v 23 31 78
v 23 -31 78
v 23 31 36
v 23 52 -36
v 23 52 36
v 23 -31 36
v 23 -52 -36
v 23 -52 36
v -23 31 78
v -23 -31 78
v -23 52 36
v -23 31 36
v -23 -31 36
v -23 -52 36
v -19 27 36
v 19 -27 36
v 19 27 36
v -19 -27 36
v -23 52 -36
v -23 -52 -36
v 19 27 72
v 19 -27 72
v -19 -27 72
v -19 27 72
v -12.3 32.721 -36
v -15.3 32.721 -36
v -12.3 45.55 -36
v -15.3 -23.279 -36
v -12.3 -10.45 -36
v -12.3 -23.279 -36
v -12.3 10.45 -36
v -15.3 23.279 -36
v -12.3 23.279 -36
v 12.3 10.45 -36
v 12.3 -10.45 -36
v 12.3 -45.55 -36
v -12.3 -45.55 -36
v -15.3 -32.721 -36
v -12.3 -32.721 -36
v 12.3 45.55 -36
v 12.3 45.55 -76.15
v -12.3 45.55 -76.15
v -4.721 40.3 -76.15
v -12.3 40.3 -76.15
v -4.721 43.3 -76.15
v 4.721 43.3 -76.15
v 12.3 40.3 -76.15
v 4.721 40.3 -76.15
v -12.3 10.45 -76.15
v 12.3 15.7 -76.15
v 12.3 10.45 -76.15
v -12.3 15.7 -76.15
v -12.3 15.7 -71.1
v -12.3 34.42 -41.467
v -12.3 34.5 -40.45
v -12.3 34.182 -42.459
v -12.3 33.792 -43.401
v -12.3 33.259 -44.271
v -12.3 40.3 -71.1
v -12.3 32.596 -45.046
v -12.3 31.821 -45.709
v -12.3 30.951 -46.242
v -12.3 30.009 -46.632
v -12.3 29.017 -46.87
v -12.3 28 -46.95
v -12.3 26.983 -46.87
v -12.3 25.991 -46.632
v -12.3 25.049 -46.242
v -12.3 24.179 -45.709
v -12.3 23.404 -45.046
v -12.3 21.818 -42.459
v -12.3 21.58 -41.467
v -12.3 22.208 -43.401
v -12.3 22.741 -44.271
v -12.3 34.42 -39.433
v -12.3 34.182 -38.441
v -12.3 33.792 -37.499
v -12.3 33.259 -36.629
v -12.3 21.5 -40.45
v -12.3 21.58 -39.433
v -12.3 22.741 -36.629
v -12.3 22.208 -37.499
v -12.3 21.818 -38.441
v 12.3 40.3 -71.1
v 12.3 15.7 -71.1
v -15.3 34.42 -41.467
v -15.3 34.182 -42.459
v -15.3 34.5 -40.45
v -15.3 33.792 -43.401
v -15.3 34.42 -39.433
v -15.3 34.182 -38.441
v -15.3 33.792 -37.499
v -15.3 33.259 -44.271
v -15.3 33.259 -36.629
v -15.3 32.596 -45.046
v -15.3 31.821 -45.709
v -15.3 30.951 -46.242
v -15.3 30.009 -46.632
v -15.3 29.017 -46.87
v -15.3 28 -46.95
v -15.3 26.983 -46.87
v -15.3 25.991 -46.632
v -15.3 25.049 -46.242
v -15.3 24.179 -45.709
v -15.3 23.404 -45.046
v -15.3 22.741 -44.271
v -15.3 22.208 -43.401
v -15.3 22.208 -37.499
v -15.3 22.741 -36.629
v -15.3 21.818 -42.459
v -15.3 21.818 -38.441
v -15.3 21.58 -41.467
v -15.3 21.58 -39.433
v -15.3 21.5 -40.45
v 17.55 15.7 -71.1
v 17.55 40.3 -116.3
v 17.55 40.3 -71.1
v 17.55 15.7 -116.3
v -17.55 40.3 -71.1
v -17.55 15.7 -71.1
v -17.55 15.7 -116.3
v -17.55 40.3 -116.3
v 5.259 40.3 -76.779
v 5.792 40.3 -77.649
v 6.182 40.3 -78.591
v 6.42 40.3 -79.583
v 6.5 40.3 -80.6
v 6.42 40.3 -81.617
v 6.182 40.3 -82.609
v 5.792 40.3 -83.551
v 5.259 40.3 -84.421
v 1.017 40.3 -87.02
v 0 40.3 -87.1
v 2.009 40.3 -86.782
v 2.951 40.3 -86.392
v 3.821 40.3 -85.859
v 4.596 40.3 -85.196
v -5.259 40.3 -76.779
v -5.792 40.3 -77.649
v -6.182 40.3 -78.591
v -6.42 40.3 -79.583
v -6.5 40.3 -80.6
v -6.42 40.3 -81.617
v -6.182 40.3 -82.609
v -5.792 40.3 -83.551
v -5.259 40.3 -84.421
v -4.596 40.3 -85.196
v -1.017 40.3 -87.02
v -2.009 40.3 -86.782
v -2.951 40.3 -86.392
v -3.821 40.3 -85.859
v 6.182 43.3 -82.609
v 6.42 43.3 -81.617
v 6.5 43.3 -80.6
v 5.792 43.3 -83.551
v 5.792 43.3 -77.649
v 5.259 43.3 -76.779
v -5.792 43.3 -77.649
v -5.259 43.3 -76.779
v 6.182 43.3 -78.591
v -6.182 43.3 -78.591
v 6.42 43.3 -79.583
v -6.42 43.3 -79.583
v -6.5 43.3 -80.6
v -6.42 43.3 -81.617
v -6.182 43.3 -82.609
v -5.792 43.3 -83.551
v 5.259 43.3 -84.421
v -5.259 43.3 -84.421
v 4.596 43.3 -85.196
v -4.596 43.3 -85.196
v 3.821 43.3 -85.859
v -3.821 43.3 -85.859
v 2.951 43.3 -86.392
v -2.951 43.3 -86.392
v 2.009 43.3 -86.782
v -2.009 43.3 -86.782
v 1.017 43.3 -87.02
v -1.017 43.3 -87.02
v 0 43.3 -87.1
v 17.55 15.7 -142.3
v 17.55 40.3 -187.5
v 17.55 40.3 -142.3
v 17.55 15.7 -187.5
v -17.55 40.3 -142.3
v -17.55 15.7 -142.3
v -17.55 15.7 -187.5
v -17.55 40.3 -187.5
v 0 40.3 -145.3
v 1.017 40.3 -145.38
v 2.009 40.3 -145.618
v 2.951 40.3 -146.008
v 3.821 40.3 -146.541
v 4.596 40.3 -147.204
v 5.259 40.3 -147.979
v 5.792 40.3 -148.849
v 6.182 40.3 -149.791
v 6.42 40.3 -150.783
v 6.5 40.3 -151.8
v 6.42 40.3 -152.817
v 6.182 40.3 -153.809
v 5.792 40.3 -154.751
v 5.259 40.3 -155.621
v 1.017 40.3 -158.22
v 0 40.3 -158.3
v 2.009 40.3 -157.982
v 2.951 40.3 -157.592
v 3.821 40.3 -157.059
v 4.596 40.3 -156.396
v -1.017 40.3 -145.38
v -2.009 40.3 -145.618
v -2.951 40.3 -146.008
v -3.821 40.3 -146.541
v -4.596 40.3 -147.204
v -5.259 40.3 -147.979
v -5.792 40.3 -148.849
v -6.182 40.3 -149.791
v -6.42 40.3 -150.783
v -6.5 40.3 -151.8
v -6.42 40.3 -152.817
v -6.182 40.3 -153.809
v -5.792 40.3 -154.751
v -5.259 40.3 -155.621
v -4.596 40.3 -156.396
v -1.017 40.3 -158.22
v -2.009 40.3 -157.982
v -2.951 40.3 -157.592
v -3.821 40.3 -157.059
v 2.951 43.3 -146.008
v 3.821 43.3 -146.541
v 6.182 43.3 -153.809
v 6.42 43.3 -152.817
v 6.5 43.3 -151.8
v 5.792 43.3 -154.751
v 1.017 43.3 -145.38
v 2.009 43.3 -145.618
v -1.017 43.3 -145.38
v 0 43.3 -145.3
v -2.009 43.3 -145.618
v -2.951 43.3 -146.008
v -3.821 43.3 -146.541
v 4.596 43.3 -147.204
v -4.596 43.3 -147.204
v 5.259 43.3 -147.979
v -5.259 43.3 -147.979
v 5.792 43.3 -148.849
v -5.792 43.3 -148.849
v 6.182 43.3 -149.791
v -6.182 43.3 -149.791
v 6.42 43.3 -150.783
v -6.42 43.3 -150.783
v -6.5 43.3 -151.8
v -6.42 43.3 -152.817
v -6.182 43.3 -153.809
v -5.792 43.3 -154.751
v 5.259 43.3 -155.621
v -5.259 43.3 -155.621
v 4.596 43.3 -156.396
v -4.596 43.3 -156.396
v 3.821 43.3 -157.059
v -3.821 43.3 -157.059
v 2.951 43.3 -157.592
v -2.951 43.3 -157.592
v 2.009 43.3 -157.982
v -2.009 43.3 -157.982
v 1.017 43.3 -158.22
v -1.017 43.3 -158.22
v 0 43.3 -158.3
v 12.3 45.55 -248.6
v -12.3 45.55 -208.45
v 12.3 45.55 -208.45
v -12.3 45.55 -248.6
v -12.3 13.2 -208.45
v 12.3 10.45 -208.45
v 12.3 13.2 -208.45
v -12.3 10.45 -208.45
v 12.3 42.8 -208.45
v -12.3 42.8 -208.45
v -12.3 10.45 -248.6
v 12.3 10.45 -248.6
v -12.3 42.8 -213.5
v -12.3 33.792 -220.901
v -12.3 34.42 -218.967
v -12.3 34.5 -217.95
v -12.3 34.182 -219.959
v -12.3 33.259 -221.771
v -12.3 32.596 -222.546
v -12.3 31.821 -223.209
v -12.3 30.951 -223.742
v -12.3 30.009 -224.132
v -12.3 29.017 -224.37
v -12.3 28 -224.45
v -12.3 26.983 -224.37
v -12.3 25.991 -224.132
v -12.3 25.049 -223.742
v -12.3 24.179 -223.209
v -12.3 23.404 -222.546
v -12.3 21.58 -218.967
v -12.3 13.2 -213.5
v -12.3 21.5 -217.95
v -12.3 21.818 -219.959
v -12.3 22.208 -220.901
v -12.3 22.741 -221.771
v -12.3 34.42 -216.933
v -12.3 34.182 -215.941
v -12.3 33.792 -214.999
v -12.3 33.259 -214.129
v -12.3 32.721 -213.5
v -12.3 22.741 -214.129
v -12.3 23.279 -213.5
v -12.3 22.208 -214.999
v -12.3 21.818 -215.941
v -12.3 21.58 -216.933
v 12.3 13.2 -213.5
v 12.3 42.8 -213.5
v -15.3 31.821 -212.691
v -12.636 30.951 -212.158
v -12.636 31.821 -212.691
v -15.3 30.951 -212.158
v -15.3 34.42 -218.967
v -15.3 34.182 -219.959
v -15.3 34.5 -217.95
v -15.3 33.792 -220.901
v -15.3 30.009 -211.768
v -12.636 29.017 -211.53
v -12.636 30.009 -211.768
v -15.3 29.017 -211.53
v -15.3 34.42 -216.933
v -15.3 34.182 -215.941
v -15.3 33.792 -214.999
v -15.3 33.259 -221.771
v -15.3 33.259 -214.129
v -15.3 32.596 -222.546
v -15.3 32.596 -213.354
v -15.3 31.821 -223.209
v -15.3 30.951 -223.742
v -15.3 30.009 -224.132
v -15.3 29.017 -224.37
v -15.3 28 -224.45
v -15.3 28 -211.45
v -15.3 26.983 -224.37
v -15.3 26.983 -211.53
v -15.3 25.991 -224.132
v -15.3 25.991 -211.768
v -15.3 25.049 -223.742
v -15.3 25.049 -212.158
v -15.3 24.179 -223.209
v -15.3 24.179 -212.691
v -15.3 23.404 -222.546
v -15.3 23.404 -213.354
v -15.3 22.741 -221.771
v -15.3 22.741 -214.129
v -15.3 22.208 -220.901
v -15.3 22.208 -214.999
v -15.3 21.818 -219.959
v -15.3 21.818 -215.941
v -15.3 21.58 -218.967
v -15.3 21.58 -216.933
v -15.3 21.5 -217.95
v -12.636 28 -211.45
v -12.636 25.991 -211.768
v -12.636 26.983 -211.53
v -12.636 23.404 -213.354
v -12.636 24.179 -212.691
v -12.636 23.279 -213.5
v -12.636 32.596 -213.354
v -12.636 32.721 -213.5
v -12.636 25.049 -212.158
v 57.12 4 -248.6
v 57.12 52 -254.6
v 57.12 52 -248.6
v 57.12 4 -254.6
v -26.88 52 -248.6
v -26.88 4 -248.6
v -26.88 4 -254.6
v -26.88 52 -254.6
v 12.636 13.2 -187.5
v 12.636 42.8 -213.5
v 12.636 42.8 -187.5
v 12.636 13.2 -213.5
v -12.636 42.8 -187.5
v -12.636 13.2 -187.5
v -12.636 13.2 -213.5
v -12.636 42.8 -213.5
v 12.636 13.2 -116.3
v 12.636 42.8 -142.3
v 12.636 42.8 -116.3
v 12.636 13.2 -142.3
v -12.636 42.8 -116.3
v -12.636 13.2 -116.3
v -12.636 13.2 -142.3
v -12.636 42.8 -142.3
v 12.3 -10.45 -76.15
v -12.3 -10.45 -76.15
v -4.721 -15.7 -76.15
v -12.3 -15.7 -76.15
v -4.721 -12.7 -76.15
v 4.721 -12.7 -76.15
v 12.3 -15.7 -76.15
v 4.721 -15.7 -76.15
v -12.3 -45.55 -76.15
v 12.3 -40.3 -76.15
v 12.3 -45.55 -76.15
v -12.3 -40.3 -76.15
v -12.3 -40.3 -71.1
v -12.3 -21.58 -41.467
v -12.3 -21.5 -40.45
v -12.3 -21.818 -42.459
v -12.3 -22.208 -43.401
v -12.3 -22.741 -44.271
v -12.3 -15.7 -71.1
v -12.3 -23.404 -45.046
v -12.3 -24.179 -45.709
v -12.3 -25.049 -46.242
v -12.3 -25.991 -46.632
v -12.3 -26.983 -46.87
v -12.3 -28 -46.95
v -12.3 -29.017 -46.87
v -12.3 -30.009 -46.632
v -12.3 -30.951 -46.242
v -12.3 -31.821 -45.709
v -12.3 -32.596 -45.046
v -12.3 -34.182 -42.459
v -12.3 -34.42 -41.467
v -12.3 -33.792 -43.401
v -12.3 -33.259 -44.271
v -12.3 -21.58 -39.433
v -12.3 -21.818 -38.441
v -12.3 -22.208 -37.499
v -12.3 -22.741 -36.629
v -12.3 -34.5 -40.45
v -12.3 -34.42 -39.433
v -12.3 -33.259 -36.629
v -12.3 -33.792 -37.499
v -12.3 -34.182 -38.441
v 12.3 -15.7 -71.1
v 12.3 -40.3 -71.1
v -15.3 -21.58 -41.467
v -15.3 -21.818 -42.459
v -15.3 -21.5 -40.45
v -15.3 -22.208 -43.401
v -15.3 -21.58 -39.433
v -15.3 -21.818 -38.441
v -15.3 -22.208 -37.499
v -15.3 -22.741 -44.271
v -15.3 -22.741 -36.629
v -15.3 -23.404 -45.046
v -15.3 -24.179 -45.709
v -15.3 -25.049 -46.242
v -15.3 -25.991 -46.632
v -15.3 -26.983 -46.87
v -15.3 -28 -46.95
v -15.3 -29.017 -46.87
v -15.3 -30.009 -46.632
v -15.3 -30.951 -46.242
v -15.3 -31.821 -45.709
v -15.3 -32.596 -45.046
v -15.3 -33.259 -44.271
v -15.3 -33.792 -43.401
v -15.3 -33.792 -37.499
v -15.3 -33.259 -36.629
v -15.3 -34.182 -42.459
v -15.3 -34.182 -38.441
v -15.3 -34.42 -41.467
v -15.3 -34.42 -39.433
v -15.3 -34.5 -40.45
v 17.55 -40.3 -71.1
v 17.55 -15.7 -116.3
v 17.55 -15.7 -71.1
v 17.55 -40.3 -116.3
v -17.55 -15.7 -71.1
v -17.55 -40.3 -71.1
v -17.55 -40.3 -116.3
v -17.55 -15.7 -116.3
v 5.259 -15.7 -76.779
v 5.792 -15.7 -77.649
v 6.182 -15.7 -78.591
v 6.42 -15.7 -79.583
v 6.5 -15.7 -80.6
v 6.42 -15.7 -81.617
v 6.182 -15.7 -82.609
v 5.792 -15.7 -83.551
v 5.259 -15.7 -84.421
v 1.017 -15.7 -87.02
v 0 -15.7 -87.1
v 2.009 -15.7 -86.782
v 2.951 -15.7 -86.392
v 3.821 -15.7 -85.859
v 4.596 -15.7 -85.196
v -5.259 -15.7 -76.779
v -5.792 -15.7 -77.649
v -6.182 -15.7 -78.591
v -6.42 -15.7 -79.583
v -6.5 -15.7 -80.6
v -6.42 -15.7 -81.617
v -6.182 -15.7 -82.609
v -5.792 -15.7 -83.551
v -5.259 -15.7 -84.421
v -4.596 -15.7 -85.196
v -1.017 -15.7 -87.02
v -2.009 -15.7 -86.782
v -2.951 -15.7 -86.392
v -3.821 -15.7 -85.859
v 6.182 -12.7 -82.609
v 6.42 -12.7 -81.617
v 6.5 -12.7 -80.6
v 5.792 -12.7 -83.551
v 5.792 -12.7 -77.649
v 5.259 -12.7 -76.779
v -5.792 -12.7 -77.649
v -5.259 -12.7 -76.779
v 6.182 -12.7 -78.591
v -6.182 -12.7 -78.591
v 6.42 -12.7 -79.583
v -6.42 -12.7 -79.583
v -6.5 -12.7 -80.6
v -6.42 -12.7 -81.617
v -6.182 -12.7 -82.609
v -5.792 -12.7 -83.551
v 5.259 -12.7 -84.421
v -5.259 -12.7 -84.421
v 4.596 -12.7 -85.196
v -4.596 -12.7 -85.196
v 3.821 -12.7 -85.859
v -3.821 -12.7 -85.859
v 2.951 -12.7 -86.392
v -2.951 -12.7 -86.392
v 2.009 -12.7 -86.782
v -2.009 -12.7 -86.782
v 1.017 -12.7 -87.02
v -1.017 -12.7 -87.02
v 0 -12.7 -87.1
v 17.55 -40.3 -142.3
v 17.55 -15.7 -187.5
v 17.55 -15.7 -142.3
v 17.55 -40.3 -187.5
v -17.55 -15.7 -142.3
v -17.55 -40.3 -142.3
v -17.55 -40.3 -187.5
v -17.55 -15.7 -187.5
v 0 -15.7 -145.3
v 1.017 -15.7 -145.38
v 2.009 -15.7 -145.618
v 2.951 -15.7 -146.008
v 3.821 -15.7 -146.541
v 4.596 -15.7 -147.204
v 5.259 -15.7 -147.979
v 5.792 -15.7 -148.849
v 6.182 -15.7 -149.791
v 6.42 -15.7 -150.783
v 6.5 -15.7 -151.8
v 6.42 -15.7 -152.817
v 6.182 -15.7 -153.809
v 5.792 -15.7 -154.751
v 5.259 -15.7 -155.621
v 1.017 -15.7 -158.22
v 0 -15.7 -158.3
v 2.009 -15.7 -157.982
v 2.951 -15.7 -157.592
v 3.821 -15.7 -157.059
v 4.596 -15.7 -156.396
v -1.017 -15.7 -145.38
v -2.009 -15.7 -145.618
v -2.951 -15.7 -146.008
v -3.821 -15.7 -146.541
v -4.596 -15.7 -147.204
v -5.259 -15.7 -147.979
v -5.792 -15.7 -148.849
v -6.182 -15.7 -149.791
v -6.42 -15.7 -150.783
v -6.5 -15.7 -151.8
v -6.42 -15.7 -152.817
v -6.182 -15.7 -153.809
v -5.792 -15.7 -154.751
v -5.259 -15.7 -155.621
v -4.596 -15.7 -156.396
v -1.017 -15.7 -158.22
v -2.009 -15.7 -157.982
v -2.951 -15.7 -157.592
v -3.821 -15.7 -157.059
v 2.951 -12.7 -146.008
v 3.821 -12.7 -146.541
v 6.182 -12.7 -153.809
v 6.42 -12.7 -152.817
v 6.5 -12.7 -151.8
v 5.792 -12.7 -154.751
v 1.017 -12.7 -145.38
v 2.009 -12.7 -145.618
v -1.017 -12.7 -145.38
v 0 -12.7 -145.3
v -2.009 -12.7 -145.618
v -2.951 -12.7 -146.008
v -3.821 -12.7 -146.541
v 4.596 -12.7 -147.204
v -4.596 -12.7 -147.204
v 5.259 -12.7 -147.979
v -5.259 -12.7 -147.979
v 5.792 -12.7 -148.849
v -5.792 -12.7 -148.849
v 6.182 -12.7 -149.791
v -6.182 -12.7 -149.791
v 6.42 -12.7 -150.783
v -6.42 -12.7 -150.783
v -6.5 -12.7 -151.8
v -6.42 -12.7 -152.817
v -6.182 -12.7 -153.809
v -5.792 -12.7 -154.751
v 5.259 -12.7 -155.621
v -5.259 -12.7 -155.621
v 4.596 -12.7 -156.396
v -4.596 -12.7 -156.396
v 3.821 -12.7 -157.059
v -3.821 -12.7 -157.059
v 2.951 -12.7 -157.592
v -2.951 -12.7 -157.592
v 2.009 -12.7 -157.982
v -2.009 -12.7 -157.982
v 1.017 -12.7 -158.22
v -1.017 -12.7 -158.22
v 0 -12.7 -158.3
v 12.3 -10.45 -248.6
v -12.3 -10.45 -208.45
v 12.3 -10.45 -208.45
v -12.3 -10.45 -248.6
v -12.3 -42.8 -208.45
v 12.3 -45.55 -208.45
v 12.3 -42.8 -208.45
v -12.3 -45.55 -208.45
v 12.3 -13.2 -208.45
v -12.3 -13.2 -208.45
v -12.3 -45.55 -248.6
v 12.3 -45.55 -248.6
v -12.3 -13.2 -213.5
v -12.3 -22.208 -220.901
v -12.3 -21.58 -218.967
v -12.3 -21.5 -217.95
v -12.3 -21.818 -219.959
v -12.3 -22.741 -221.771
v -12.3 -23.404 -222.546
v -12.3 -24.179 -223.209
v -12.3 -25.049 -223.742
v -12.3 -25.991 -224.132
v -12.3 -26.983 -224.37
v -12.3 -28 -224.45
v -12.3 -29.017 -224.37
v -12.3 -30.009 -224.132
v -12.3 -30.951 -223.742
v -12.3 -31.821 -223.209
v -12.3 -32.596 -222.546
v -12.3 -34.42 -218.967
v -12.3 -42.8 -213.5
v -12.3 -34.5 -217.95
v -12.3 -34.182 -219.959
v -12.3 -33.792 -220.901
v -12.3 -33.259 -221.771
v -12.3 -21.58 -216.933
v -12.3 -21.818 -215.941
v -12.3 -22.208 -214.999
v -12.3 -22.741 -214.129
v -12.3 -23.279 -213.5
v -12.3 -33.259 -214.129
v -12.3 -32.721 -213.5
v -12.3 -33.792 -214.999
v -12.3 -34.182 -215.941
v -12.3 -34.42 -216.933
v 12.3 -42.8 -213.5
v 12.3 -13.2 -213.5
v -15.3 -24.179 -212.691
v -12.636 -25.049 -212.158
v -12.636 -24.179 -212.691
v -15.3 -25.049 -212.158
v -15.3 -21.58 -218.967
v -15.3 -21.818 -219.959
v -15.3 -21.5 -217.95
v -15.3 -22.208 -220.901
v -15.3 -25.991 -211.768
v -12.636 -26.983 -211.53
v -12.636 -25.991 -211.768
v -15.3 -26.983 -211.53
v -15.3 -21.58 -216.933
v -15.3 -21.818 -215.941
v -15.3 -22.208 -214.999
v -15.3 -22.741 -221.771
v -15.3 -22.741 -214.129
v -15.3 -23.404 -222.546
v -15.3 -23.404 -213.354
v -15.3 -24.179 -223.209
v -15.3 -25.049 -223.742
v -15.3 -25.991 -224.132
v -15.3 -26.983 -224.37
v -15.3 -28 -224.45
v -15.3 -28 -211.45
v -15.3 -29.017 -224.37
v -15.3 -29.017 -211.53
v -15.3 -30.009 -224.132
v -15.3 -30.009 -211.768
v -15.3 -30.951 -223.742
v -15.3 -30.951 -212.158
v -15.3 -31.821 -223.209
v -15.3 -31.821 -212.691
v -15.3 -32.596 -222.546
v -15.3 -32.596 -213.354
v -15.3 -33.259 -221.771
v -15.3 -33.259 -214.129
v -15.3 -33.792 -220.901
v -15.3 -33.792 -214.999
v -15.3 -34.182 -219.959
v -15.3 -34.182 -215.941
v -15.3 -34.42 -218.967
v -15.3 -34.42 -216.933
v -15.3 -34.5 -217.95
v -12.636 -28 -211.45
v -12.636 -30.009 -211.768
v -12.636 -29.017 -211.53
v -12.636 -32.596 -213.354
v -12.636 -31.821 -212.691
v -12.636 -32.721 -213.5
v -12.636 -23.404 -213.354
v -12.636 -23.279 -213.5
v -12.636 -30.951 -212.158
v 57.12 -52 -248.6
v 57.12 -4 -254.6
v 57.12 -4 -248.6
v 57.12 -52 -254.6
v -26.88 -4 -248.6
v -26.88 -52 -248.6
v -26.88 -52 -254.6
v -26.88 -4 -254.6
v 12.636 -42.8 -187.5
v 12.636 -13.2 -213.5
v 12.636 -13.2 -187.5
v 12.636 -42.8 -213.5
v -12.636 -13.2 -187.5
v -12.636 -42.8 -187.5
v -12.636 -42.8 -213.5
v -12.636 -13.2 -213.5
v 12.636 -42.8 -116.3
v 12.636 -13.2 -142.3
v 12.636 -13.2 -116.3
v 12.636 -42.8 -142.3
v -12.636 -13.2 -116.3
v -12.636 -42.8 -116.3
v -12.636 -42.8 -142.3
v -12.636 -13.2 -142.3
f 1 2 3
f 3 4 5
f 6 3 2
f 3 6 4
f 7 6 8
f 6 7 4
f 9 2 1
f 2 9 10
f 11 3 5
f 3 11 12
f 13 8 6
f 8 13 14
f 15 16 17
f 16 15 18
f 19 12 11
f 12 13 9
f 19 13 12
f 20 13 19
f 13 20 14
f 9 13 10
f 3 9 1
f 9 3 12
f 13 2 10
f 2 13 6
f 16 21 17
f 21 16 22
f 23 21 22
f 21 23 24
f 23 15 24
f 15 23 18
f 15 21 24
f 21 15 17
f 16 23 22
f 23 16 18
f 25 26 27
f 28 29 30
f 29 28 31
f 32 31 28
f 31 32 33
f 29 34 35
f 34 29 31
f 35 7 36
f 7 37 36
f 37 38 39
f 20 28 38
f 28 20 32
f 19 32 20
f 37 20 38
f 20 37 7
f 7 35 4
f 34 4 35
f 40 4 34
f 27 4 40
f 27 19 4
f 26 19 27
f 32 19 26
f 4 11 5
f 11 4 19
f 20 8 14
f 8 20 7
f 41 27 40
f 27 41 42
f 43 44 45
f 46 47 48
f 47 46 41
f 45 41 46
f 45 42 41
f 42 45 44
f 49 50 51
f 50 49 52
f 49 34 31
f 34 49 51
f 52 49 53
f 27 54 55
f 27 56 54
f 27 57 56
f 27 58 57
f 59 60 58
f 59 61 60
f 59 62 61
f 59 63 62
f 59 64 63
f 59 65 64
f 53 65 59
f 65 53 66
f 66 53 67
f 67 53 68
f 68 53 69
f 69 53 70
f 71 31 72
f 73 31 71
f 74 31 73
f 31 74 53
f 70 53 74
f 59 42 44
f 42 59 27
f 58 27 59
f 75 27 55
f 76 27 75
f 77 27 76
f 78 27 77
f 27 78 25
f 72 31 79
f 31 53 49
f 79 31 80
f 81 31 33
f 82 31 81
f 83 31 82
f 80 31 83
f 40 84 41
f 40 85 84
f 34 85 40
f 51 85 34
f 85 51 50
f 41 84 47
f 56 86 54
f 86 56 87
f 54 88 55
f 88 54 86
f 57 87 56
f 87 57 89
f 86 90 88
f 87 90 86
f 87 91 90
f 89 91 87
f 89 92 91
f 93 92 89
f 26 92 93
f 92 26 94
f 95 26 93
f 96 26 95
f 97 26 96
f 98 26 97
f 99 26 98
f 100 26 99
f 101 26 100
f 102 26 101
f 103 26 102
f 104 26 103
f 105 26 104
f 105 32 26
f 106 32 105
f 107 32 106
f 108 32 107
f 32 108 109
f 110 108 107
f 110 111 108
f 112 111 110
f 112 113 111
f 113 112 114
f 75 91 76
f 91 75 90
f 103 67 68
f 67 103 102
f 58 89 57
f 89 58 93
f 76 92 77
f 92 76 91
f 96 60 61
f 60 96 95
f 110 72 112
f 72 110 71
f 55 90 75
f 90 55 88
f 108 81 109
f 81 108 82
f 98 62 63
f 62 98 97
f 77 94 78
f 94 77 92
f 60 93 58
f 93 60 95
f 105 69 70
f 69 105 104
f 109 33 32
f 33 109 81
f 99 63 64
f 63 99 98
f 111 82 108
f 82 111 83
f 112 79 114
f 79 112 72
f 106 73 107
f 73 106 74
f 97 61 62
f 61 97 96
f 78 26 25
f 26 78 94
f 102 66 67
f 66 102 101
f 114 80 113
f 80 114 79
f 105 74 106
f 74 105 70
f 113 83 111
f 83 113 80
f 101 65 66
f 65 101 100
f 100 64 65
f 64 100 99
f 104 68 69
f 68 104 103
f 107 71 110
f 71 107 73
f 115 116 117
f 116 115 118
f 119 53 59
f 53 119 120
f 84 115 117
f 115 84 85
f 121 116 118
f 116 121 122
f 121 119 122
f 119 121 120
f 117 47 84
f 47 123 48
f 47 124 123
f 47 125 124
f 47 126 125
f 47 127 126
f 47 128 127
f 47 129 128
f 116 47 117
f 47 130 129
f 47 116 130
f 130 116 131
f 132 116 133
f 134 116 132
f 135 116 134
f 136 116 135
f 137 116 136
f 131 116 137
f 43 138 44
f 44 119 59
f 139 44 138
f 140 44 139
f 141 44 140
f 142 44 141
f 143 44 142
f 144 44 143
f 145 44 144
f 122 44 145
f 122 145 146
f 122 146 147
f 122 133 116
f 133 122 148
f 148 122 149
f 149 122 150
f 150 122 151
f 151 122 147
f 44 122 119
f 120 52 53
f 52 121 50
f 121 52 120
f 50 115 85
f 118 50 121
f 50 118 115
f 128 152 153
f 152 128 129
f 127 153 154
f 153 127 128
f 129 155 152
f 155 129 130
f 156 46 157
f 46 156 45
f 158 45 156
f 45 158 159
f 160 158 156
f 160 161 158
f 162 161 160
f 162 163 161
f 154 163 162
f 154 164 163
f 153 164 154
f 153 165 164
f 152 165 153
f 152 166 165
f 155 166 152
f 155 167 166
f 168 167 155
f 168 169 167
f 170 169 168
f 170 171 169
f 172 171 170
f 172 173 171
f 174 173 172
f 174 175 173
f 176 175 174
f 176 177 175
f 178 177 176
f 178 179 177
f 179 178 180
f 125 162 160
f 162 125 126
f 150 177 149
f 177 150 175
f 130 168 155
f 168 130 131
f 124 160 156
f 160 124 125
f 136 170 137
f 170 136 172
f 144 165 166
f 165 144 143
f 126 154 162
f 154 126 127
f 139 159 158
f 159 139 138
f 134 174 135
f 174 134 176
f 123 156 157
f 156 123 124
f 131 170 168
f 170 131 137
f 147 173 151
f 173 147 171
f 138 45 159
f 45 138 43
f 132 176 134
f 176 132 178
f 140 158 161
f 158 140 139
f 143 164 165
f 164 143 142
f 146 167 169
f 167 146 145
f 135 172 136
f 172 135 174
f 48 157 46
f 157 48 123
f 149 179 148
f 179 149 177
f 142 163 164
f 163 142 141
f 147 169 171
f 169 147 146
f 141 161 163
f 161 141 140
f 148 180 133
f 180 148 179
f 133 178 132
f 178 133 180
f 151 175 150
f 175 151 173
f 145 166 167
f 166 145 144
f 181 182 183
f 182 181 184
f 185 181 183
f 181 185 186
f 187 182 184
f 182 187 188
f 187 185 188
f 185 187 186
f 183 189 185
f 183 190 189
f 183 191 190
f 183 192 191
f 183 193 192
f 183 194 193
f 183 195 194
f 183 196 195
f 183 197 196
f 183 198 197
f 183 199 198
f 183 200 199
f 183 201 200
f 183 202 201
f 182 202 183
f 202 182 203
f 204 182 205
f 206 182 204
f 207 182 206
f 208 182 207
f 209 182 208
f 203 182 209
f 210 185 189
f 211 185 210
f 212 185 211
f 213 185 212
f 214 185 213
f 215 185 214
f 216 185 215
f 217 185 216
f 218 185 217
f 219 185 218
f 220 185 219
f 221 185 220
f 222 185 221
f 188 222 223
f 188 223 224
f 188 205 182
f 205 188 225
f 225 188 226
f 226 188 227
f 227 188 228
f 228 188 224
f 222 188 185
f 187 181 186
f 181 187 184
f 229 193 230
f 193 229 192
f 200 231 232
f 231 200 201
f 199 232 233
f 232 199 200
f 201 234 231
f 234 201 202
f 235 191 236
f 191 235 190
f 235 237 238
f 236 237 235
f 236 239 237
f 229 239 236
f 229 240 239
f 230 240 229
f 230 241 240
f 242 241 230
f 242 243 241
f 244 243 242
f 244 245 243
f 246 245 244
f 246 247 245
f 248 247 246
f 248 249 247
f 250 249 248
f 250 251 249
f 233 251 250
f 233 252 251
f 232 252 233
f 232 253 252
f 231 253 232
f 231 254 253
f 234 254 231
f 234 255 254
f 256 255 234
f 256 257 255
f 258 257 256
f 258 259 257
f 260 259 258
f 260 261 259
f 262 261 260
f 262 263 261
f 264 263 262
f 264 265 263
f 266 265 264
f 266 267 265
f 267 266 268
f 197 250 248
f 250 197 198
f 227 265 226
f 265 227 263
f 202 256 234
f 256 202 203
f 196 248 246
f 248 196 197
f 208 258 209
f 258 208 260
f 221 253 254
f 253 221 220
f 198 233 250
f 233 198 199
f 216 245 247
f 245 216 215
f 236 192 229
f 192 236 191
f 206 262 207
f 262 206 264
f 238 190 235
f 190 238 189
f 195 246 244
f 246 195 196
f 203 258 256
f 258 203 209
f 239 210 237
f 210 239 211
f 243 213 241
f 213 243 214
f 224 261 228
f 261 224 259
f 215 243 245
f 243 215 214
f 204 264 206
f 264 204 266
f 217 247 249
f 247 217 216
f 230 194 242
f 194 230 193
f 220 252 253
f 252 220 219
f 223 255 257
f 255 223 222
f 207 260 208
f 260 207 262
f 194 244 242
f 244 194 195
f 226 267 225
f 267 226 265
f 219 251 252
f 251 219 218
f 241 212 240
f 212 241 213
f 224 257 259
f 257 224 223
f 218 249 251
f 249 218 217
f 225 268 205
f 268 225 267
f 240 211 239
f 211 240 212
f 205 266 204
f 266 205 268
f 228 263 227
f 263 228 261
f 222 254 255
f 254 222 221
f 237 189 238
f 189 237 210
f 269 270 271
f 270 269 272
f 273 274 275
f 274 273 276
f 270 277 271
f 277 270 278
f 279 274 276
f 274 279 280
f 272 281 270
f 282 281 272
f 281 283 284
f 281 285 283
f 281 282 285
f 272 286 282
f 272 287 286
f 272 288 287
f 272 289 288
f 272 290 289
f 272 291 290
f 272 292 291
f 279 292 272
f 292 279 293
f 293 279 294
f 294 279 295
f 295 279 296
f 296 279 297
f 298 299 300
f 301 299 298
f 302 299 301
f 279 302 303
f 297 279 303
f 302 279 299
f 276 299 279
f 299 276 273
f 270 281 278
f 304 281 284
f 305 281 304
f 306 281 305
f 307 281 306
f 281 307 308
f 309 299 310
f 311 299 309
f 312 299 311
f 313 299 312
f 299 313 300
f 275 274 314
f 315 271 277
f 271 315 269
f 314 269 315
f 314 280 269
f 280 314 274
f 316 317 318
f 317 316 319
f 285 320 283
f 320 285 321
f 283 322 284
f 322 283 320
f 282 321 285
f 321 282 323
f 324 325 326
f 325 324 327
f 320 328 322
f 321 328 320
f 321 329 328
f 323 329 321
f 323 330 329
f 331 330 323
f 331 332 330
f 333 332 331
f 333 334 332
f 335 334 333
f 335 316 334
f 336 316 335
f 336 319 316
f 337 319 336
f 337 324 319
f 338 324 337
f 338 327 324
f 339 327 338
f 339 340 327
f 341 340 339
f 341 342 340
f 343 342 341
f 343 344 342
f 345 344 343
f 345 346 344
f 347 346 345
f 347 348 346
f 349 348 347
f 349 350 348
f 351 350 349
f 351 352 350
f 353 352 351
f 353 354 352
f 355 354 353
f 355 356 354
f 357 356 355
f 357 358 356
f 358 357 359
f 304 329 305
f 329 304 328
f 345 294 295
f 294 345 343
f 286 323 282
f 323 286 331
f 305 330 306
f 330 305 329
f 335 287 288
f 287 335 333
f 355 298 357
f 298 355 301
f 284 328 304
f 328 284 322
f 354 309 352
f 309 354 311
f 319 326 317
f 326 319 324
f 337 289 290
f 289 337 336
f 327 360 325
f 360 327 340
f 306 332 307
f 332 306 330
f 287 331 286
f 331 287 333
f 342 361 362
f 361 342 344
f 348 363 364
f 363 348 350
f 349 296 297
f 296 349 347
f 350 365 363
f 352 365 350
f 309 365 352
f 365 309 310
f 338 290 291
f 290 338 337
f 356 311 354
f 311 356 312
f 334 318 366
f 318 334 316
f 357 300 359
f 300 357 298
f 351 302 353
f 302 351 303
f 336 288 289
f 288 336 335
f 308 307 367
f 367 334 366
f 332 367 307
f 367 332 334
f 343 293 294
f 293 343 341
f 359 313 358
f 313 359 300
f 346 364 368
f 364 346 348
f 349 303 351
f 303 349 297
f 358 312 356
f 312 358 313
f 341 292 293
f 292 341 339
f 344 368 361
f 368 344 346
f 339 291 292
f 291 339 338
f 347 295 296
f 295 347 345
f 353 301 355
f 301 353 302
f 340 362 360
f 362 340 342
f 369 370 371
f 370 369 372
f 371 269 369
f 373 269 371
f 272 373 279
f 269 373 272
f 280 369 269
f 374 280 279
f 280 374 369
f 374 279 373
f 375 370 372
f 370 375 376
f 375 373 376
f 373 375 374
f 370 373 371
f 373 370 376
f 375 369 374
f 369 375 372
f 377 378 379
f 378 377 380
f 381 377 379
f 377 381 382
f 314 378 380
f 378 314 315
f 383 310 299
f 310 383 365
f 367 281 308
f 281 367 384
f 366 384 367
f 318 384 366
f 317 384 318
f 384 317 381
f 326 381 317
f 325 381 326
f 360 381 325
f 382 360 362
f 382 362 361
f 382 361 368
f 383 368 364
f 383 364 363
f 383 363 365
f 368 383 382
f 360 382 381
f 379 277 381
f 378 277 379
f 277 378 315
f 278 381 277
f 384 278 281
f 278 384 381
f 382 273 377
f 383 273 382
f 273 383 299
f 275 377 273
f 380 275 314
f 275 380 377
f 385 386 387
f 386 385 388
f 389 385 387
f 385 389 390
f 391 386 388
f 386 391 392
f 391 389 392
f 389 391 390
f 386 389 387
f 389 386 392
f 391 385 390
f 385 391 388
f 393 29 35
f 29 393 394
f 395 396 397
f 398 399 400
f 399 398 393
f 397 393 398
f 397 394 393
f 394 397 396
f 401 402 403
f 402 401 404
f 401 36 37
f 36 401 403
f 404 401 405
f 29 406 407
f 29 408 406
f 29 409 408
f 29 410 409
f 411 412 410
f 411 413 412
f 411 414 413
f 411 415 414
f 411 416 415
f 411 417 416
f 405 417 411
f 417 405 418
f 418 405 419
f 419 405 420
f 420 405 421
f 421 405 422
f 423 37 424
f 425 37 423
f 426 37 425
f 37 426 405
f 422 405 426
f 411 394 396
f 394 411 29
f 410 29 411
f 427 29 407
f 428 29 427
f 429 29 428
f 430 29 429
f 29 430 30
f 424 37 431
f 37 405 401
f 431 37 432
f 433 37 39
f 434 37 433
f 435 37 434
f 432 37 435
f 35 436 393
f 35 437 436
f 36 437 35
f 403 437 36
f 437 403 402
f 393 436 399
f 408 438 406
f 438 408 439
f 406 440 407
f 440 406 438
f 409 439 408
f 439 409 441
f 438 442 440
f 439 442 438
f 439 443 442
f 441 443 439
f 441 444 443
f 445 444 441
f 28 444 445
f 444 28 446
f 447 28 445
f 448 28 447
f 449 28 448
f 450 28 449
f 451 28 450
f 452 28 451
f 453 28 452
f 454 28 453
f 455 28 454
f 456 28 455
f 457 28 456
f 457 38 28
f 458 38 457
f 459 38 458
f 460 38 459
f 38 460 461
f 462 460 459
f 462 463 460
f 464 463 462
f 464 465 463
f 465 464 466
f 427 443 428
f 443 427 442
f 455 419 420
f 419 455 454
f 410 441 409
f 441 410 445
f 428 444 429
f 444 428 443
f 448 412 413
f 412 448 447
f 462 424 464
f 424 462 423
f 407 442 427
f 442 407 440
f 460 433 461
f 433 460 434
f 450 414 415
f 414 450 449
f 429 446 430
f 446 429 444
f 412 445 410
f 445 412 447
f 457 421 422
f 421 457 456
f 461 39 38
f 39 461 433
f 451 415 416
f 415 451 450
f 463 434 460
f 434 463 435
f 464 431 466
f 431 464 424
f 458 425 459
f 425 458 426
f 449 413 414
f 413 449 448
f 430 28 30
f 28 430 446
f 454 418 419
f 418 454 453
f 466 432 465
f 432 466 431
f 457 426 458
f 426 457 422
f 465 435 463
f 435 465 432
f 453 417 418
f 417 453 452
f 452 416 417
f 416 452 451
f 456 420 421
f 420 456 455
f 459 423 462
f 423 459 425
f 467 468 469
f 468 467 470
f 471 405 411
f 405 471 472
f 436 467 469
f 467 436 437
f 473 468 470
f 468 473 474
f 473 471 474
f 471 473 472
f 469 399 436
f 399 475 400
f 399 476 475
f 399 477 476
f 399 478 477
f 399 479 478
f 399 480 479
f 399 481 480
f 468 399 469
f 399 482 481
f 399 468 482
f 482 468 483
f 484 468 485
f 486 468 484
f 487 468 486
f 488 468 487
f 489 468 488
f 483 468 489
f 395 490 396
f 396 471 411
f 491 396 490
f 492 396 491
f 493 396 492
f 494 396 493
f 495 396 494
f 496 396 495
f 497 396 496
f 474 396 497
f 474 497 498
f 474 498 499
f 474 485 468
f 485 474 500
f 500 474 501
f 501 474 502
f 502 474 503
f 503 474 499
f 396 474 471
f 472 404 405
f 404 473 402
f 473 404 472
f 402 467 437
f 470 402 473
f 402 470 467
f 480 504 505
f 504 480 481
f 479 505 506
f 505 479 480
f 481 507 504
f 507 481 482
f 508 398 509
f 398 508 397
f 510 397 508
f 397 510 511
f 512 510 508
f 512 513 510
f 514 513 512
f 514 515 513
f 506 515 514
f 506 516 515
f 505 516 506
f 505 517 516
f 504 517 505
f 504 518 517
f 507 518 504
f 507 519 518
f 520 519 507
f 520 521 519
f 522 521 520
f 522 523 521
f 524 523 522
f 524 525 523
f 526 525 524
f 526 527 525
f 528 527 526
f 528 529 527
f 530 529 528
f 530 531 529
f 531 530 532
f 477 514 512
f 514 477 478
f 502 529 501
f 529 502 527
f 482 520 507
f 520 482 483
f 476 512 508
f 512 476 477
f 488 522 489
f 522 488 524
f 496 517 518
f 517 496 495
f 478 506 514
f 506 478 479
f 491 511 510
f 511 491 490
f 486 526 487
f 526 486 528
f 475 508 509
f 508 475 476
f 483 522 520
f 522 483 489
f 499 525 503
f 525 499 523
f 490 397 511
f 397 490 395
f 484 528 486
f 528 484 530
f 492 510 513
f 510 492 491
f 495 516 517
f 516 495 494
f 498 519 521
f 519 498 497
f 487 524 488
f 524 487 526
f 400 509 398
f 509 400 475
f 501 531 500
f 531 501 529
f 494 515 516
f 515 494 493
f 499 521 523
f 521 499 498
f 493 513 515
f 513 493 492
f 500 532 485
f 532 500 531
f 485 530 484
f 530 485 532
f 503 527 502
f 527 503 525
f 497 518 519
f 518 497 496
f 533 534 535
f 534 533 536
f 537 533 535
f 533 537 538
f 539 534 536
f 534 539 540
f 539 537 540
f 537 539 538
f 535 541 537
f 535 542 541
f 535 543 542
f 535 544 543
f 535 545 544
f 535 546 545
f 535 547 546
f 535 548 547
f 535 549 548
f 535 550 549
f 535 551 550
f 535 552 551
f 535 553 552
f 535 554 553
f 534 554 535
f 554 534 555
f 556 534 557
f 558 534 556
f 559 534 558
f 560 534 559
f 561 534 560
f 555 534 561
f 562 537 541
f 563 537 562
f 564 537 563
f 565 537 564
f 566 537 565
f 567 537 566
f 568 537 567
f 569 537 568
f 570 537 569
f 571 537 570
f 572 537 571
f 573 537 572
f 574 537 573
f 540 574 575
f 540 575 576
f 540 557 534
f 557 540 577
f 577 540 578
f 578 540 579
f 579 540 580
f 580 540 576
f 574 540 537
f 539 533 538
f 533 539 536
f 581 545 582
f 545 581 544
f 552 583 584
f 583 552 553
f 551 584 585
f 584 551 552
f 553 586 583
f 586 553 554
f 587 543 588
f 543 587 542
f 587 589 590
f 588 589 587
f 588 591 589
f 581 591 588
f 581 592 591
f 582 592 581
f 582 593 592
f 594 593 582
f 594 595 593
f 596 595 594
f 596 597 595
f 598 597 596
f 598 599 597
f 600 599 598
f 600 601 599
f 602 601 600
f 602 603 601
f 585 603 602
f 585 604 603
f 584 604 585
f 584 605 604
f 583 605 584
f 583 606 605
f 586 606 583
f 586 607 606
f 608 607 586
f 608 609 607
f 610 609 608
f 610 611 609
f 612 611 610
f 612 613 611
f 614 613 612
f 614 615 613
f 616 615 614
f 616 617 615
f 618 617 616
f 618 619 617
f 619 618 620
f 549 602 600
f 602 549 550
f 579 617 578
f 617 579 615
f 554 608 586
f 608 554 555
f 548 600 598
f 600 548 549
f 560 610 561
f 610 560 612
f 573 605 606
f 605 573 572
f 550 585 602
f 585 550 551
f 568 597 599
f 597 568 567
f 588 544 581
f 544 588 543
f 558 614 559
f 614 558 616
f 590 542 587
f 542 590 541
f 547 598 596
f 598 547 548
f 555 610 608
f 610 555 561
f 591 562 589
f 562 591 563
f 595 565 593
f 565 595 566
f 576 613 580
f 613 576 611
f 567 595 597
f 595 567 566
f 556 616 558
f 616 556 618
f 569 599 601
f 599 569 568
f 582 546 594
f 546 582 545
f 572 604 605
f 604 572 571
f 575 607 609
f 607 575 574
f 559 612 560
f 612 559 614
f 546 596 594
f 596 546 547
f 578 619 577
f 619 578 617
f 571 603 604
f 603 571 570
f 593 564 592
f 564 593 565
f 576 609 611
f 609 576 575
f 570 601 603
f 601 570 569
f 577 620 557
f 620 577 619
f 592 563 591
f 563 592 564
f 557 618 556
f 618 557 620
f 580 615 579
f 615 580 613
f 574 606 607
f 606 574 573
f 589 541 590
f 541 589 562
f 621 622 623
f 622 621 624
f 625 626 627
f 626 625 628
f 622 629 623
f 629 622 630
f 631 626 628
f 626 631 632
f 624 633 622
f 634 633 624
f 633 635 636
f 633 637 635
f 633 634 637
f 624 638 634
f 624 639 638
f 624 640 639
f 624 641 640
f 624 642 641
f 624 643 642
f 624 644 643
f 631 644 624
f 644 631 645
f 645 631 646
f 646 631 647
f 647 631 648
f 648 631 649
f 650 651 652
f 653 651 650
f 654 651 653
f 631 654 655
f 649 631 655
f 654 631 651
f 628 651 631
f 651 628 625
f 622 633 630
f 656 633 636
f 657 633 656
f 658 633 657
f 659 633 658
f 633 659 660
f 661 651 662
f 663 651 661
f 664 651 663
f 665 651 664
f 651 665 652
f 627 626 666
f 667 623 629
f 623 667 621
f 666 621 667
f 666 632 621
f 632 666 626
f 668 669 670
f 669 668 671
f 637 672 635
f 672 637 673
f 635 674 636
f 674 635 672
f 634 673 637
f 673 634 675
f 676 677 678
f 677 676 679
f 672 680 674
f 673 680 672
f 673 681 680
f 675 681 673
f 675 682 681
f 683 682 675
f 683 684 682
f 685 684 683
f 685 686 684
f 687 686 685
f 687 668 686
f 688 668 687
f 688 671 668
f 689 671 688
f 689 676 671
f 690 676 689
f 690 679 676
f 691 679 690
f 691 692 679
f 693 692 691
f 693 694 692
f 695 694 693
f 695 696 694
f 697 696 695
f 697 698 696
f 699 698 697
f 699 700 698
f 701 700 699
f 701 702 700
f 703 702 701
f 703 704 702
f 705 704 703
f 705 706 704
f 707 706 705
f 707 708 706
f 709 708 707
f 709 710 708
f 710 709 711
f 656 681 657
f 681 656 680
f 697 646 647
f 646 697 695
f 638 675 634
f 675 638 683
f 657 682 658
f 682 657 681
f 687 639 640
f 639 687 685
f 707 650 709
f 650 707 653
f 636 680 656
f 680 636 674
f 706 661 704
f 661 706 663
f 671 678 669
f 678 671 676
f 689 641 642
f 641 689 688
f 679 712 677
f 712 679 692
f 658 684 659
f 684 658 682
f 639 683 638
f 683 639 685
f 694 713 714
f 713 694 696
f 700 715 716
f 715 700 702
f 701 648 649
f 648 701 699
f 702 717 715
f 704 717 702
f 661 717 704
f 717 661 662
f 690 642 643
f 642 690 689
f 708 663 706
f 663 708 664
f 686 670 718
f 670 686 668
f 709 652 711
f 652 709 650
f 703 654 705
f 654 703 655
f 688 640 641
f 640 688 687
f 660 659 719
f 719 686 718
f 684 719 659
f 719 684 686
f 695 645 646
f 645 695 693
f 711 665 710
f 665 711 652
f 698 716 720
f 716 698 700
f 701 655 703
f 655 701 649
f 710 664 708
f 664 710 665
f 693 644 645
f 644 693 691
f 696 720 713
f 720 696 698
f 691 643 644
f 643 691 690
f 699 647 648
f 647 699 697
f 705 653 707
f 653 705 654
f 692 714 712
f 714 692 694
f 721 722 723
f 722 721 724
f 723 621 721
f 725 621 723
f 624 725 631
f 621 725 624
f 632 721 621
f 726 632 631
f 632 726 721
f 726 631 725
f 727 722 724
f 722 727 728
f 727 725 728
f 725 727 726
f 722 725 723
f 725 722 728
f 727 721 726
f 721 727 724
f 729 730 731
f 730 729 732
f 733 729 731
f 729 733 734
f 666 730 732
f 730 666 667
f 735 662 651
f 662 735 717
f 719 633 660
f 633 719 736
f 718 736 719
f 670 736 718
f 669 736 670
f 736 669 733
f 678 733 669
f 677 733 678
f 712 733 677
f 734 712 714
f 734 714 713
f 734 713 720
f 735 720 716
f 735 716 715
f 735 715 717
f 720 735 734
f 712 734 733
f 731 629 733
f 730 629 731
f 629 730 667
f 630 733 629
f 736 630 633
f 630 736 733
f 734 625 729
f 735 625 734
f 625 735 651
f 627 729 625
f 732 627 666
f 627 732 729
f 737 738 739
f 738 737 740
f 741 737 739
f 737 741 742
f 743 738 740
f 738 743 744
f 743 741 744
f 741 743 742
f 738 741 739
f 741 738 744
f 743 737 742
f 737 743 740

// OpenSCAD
// Parametric biped skeleton (Bimo-like), servo-anchored massing model.
// Why: lock proportions + the 8x STS3215 joint layout before designing printable parts.
// Axes: X = forward, Y = left/right, Z = up. Servo bodies ARE the limb segments.

$fn = 40;

// --- STS3215 servo (measured: 45.2 x 24.6 x 35.1 mm) ---
sl = 45.2;   // long axis  -> runs along the limb
sw = 24.6;   // thin axis
sh = 35.1;   // tall/gearbox axis -> fore-aft depth
horn_d   = 13;
horn_off = 9.5;   // output disc offset from the top end

// --- structure ---
thigh = 26;  // bracket length hip-servo -> knee-servo
shin  = 26;  // bracket length knee-servo -> ankle-servo
foot_l = 84; foot_w = 48; foot_t = 6;

// --- torso + head (SBC cavity) ---
td = 46; tw = 104; th = 72;   // depth, width, height; width clears 2 hips side-by-side
hip_sep = 56;                 // leg center-to-center
hd = 46; hw = 62; hh = 42;    // head box

// --- pose (deg) — override at render time with -D to show range of motion ---
p_roll = 0; p_hip = 0; p_knee = 0; p_ankle = 0;
gait = 0;   // fore/aft hip split: +gait one leg forward, other back (walking demo)

col_servo  = [0.22,0.23,0.27];
col_struct = [0.80,0.82,0.85];
col_head   = [0.20,0.45,0.70];
col_horn   = [0.85,0.72,0.15];

// Servo with output axis along +Y and body long axis along Z (a vertical limb link).
module servo_pitch() {
  color(col_servo) cube([sh, sw, sl], center=true);
  color(col_horn)
    translate([0, sw/2, sl/2 - horn_off]) rotate([-90,0,0]) cylinder(d=horn_d, h=3);
}

// Simple structural bracket between two servos.
module link(len) {
  color(col_struct) translate([0,0,-len/2]) cube([sh*0.72, sw+5, len], center=true);
}

module foot() {
  color(col_struct) translate([foot_l*0.18, 0, -foot_t/2])
    cube([foot_l, foot_w, foot_t], center=true);
}

// One leg. side = +1 (left) / -1 (right). Forward-kinematic chain so joints bend.
module leg(side) {
  translate([0, side*hip_sep/2, -th/2]) {
    rotate([p_roll*side, 0, 0]) {                 // hip roll (about X)
      translate([0,0,-sh/2]) rotate([0,0,90]) servo_pitch();   // roll servo under torso
      translate([0,0,-sh])
        rotate([0, p_hip + side*gait, 0]) {       // hip pitch (about Y) + gait split
          translate([0,0,-sl/2]) servo_pitch();   // thigh = servo body
          translate([0,0,-sl]) {
            link(thigh);
            translate([0,0,-thigh])
              rotate([0, p_knee, 0]) {            // knee
                translate([0,0,-sl/2]) servo_pitch();  // shin = servo body
                translate([0,0,-sl]) {
                  link(shin);
                  translate([0,0,-shin])
                    rotate([0, p_ankle, 0]) {     // ankle
                      translate([0,0,-sh/2]) rotate([0,0,90]) servo_pitch();
                      translate([0,0,-sh]) foot();
                    }
                }
              }
          }
        }
    }
  }
}

module torso() {
  color(col_struct) cube([td, tw, th], center=true);
  // head with hollow SBC cavity
  translate([0,0, th/2 + hh/2])
    color(col_head) difference() {
      cube([hd, hw, hh], center=true);
      translate([0,0,-3]) cube([hd-8, hw-8, hh-6], center=true);
    }
}

module biped() {
  torso();
  leg(1);
  leg(-1);
}

biped();
